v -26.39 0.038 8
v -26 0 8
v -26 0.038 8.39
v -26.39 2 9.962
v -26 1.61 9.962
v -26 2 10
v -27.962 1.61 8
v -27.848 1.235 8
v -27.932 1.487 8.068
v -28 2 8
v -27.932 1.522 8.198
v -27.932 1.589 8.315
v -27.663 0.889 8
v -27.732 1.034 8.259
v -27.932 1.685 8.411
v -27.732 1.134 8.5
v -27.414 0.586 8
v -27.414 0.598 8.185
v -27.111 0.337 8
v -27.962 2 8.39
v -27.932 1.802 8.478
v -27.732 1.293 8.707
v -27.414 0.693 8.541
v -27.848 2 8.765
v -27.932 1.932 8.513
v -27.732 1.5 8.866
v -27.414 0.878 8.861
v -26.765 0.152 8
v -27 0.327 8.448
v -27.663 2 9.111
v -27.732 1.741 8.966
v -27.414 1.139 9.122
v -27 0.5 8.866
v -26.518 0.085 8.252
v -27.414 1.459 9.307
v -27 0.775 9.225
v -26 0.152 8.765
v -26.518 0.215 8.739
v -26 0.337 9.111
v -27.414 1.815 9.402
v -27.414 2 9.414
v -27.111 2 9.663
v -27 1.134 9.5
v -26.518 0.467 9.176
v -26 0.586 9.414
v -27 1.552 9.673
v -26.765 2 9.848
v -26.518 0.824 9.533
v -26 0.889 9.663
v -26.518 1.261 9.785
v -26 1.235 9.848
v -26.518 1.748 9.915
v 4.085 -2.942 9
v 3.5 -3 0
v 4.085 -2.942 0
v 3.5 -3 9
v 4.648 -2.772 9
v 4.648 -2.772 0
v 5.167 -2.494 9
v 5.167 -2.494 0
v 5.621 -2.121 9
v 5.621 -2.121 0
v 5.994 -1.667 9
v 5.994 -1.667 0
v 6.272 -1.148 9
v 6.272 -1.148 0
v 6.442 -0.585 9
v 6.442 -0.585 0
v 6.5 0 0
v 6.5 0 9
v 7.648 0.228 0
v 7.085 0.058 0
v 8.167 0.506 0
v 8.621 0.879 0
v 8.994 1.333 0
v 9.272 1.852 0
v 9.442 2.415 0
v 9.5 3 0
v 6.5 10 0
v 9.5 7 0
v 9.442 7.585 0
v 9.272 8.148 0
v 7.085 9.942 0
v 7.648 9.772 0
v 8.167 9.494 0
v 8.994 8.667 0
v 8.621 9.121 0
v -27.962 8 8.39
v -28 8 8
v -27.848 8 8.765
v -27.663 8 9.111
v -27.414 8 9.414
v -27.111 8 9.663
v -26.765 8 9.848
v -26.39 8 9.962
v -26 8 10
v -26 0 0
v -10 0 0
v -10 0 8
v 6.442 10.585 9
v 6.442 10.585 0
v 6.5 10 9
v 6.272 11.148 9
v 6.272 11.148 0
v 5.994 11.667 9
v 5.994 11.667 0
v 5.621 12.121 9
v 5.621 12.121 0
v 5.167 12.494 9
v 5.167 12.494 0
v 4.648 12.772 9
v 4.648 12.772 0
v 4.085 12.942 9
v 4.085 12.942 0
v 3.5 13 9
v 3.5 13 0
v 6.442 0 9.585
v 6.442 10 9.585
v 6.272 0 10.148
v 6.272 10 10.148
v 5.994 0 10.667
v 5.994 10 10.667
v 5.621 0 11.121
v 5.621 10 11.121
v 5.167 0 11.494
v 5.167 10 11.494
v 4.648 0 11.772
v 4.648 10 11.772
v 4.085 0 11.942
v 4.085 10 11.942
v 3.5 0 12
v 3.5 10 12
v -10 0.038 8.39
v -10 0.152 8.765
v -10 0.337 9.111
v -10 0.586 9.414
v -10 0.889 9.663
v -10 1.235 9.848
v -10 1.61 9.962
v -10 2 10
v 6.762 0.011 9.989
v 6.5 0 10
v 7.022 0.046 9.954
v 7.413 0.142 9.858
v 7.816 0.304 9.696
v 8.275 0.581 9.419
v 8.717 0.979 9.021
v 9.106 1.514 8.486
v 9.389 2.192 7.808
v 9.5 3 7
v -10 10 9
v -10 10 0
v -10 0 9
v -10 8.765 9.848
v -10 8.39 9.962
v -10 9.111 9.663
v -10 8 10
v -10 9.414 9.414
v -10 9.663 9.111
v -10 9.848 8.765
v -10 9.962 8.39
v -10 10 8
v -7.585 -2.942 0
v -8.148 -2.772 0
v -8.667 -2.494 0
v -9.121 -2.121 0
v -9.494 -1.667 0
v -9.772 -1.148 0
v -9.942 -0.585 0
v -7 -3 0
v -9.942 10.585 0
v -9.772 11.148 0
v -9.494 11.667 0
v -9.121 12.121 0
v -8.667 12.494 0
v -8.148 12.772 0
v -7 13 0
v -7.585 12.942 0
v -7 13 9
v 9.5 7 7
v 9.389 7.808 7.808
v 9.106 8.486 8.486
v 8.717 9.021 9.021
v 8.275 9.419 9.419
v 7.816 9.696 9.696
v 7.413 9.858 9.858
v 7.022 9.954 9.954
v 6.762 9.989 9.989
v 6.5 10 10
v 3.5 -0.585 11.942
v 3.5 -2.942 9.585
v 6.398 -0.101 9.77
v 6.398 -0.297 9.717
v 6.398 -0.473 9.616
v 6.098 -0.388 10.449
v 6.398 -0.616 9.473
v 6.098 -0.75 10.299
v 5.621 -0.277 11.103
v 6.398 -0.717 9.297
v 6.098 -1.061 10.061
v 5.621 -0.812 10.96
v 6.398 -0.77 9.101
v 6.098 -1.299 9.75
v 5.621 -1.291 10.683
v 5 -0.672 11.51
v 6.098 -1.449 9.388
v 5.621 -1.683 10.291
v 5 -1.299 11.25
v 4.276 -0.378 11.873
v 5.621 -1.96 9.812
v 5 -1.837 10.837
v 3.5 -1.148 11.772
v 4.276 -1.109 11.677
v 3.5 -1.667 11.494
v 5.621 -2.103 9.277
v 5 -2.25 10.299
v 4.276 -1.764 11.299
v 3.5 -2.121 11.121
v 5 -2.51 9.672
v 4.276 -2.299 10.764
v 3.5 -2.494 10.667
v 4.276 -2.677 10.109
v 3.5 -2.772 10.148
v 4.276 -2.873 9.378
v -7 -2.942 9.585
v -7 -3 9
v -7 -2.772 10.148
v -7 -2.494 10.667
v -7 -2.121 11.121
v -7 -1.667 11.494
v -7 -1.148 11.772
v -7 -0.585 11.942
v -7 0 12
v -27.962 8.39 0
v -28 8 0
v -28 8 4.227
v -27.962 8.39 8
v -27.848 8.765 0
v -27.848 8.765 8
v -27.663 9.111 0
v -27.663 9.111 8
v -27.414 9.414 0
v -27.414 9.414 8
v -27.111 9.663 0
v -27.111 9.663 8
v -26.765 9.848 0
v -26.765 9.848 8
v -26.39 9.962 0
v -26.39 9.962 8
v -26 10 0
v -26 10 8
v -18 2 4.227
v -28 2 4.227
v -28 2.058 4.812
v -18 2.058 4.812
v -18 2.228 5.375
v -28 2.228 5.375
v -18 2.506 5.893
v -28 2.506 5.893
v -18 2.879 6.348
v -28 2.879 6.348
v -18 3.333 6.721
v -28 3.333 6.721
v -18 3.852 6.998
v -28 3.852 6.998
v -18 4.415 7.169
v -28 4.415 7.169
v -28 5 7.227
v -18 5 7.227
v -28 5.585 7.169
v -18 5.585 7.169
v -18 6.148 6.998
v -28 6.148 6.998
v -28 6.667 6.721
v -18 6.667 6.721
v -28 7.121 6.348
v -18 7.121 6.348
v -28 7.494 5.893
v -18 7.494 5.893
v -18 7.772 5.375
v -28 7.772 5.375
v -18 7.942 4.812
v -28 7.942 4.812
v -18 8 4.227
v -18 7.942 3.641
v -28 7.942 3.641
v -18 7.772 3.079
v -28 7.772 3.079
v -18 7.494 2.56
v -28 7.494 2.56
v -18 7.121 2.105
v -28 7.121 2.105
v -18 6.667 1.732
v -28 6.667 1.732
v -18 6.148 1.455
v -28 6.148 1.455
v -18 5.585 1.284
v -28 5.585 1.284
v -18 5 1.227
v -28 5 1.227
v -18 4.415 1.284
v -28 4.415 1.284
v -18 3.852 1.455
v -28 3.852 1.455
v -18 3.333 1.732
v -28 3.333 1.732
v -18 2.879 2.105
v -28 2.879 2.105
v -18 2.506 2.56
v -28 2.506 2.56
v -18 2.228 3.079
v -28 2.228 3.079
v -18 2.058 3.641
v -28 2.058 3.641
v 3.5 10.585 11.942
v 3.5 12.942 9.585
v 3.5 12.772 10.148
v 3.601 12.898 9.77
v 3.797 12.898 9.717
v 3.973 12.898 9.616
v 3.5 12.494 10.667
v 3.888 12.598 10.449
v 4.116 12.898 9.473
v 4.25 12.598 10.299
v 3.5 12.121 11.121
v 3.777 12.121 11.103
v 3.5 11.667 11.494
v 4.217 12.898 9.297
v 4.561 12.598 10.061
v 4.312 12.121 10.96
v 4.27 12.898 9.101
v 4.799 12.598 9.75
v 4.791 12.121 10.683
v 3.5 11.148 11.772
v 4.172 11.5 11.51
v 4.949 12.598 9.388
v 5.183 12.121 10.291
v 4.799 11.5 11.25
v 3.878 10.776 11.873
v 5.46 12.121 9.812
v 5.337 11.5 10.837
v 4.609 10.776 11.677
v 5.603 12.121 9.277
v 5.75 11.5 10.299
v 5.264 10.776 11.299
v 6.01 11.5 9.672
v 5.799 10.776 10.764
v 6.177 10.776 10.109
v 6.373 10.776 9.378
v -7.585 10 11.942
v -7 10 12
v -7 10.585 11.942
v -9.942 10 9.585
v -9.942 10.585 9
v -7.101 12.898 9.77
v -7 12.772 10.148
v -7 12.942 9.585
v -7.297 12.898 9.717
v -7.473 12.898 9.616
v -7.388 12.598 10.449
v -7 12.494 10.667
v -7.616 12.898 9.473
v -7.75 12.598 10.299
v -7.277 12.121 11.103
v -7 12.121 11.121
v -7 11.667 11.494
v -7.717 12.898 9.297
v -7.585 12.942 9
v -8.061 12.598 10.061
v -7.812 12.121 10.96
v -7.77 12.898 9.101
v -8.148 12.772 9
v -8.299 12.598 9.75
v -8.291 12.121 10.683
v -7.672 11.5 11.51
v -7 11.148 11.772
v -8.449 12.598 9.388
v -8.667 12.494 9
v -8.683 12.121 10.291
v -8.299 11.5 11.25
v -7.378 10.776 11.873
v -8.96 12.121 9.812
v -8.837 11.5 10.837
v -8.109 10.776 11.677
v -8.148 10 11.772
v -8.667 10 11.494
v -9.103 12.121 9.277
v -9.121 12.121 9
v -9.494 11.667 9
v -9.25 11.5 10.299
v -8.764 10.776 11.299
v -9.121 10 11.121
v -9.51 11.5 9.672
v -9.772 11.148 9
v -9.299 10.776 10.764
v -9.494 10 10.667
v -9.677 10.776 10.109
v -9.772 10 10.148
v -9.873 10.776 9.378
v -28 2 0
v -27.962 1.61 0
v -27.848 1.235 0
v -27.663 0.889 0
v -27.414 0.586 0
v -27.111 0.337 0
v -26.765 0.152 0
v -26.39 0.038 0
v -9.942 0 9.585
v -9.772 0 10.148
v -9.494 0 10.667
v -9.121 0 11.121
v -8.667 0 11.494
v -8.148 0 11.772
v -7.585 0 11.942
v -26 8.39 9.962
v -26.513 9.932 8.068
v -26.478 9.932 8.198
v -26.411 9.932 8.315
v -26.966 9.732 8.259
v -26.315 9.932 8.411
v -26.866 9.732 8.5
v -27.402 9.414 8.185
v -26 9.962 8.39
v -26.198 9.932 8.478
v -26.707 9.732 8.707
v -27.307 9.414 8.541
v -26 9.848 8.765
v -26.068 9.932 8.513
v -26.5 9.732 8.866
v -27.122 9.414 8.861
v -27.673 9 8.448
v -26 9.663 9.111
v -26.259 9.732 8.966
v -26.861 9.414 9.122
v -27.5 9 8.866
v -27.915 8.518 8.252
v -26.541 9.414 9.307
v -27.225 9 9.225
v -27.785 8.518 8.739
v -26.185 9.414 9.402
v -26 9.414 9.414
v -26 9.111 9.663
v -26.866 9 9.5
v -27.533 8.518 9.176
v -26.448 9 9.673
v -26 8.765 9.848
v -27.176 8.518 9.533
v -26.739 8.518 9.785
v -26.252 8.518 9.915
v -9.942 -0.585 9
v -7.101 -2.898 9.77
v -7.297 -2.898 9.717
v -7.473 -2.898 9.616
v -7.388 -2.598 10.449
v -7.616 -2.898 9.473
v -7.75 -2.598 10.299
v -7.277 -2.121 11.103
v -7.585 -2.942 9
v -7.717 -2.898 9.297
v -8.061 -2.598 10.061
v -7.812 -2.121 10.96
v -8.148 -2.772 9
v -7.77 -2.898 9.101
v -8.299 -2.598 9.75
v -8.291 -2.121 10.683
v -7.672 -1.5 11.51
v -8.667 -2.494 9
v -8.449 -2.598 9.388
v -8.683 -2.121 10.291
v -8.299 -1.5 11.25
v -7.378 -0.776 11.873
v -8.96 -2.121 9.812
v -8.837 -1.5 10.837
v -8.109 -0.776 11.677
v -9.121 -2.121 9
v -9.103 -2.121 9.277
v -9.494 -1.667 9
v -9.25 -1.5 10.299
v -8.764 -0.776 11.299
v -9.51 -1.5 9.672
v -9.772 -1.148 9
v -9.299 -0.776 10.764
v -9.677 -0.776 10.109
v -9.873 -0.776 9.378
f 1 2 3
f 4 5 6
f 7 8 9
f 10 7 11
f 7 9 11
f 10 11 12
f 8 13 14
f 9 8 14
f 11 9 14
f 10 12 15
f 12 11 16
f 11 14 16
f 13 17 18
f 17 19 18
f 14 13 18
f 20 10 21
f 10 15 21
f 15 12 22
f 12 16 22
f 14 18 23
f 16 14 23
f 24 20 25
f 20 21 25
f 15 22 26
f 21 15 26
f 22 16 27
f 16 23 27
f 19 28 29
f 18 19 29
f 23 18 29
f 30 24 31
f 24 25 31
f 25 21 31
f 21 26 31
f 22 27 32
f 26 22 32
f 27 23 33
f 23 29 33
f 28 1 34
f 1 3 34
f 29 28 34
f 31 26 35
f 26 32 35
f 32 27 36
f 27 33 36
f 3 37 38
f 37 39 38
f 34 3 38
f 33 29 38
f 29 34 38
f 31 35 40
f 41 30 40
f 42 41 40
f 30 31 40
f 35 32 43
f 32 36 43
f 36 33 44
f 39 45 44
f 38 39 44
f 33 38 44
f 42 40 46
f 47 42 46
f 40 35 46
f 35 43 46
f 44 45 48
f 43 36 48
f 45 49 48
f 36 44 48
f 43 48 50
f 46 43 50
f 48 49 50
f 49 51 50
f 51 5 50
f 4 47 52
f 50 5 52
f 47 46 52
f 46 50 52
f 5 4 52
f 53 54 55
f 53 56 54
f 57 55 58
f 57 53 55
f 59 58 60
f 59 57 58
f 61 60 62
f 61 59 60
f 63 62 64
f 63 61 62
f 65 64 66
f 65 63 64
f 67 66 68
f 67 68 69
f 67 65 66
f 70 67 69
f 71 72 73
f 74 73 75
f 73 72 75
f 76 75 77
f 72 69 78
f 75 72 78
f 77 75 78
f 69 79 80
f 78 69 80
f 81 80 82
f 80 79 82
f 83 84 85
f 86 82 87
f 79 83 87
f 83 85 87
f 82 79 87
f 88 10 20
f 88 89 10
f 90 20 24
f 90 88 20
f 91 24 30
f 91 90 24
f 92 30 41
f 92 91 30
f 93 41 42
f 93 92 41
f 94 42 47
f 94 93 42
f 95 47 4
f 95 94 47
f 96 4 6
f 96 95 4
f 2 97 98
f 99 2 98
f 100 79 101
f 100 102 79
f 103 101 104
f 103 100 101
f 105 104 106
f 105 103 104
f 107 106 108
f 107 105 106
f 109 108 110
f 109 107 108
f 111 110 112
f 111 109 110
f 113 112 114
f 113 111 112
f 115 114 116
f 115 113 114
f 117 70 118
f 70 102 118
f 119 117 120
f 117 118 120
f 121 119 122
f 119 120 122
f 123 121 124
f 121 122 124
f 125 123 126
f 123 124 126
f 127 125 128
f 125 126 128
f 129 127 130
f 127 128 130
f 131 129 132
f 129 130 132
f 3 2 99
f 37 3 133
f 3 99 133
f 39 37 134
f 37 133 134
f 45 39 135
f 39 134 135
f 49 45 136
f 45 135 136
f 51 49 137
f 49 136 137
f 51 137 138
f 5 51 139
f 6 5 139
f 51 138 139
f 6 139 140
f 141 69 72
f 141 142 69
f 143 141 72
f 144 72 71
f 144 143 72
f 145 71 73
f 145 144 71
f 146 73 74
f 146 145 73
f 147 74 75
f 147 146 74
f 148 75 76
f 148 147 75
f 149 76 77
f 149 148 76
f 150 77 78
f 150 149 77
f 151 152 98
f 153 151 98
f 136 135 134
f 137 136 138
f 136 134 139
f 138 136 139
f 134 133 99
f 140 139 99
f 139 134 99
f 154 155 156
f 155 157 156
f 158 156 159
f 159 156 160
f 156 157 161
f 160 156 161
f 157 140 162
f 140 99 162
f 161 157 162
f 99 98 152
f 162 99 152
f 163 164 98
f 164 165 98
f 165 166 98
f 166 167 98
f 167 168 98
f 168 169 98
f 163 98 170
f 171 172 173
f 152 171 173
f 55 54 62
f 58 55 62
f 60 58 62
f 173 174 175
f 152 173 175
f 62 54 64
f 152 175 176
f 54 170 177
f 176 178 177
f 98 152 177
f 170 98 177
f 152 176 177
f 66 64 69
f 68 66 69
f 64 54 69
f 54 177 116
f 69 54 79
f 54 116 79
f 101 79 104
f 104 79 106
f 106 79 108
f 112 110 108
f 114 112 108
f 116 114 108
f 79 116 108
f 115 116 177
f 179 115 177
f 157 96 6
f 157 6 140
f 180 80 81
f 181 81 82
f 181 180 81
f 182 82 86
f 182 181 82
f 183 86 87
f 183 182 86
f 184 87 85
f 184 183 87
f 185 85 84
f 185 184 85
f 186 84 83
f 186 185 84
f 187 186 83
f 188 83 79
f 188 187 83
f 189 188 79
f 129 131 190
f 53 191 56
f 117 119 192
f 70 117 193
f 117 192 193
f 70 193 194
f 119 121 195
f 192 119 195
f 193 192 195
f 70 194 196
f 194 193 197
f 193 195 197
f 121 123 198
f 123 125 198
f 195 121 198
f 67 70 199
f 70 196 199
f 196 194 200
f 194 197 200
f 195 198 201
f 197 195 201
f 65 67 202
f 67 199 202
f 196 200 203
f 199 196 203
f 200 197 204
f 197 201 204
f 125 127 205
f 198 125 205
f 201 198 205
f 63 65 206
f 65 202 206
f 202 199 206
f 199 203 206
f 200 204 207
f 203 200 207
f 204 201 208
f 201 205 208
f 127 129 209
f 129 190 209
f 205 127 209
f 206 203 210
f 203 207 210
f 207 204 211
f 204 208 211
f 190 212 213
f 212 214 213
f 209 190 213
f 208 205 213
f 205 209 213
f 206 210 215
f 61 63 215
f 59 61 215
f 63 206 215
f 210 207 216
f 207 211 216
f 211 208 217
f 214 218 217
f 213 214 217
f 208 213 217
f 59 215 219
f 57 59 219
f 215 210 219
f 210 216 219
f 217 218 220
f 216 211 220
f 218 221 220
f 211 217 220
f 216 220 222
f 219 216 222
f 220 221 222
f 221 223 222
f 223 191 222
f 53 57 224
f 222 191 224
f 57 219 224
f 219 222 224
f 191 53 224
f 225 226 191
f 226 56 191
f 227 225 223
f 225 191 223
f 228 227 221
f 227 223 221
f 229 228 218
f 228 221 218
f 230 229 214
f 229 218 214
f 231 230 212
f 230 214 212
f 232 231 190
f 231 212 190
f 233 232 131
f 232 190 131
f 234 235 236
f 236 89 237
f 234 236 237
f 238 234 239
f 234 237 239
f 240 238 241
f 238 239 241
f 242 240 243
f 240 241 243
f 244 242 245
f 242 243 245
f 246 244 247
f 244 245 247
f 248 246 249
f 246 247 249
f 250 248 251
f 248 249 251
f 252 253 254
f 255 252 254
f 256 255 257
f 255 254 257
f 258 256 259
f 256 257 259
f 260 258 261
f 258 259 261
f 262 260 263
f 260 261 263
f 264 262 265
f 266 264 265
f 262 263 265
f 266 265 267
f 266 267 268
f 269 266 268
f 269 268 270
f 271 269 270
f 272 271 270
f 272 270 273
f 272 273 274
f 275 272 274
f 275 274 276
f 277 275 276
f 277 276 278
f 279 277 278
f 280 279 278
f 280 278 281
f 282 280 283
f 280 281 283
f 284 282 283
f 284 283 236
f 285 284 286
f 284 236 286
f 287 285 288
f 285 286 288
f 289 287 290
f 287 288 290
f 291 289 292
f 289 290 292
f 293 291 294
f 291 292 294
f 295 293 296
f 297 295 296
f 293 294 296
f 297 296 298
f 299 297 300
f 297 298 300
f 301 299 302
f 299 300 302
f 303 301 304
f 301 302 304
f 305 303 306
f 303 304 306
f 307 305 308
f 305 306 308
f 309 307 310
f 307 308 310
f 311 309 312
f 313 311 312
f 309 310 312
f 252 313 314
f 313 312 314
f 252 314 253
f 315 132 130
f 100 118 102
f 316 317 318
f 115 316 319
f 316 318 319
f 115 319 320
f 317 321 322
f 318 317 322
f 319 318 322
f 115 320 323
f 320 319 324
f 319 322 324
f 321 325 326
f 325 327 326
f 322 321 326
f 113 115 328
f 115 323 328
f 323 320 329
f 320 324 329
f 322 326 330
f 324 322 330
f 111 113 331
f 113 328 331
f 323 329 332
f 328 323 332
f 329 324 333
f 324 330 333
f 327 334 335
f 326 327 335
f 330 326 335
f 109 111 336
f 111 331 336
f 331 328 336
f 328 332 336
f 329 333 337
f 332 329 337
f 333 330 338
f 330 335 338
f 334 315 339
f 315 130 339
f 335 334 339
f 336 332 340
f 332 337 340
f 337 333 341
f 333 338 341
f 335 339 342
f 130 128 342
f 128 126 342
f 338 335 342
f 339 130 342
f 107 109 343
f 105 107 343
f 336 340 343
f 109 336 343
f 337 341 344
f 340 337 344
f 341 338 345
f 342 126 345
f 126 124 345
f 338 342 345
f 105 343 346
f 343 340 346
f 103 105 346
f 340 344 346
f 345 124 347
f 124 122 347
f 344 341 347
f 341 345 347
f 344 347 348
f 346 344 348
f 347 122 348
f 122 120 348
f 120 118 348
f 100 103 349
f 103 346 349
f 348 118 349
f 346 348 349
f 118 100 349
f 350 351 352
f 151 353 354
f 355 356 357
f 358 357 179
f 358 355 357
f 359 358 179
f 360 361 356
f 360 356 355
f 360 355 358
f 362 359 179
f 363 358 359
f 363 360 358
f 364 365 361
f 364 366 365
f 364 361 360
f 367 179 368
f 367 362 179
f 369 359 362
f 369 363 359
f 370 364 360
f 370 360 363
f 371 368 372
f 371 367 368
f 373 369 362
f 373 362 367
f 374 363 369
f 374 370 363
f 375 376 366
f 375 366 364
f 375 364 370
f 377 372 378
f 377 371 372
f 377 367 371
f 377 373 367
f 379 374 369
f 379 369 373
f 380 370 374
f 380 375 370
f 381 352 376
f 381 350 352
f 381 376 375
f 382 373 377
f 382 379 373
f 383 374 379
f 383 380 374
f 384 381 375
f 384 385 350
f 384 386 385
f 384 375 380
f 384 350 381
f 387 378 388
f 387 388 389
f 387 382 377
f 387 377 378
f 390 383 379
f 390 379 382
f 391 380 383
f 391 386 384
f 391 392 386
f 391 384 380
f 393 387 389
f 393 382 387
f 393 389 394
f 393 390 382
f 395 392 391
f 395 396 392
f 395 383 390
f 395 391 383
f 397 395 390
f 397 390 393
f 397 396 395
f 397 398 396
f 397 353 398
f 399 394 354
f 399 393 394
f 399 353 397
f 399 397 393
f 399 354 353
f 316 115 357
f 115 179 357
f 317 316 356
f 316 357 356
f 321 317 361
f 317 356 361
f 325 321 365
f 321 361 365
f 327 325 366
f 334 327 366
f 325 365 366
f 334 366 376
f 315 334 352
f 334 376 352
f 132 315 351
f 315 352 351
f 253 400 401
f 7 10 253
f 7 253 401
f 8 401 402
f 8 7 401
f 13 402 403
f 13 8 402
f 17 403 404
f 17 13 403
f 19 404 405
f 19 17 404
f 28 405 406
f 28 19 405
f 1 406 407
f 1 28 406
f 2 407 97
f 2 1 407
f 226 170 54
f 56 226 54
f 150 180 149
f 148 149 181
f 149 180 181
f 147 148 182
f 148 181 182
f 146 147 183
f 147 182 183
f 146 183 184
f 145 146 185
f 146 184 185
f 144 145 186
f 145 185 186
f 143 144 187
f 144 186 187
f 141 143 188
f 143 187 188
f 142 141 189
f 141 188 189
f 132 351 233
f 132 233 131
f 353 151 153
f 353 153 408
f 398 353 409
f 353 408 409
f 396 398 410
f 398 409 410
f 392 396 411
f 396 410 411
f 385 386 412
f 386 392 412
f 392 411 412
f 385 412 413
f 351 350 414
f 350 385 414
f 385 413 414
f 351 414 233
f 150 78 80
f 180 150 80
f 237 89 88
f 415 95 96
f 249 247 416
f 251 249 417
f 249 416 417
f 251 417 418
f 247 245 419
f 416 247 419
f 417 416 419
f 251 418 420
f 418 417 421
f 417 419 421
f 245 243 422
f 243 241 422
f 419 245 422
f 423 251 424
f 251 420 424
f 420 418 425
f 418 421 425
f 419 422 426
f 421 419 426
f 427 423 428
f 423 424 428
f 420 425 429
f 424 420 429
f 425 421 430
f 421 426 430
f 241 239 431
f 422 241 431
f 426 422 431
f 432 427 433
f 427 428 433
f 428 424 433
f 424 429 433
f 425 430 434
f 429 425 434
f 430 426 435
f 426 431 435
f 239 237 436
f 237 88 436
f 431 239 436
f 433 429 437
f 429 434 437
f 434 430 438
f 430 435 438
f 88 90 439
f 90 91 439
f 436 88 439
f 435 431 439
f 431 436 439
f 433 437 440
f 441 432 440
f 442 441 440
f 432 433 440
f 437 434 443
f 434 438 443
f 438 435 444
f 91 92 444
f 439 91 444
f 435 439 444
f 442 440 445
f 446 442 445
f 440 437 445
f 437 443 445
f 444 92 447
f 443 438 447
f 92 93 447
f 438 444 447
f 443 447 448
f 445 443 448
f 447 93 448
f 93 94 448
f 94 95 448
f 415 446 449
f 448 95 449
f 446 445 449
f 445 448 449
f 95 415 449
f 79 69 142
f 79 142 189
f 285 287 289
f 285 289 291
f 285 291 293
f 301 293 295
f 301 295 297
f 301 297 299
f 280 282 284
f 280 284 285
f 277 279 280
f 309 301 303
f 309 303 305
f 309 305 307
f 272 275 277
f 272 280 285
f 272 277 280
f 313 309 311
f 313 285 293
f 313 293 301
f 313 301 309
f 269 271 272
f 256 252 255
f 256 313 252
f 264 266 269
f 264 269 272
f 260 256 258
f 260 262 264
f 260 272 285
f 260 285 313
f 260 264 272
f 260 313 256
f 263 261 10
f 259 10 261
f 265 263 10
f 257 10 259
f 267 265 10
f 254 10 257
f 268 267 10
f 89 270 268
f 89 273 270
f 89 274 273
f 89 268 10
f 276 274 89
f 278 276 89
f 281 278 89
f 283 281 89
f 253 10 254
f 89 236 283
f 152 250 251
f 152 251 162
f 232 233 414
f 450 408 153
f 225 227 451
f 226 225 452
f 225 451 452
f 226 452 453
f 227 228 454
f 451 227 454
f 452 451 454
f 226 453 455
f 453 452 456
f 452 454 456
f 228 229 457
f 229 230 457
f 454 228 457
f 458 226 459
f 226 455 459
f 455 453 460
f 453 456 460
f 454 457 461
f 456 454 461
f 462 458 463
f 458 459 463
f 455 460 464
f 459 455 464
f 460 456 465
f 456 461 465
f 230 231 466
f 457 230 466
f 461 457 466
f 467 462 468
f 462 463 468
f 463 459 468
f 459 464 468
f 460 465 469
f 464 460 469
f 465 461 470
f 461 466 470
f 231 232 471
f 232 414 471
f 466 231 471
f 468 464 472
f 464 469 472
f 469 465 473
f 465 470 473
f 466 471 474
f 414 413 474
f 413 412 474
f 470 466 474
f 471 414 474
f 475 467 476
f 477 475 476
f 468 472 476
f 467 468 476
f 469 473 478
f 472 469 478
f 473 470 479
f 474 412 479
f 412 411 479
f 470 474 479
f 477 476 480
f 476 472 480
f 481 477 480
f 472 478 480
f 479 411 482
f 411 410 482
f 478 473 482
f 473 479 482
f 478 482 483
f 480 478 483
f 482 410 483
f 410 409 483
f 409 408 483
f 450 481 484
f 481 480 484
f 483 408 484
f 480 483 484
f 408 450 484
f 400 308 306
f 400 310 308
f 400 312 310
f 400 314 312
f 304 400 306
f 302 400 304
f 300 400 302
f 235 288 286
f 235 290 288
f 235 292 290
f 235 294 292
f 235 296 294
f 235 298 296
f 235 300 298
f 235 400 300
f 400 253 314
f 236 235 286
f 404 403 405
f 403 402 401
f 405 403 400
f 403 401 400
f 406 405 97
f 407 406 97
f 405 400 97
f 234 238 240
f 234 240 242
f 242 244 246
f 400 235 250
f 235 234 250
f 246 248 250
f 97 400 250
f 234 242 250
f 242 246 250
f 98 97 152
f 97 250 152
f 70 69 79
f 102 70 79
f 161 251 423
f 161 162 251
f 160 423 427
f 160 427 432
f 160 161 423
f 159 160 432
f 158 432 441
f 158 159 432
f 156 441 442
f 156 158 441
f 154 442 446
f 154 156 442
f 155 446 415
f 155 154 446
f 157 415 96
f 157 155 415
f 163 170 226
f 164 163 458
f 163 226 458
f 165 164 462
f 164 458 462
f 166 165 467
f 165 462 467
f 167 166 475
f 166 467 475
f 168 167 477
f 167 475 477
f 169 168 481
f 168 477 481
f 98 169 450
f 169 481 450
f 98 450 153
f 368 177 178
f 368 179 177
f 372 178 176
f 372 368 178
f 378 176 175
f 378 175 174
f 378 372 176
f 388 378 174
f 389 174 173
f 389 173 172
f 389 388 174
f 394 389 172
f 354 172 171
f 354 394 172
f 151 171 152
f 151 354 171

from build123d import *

# Parameters (mm, degrees)
F0_W     = 18.0000008929
F0_H     = 10
F1_DEPTH = 10
F0_W_2   = 3
F2_DEPTH = 12
F3_R     = 2
F4_R     = 3
F5_R     = 2.99999
F7_DEPTH = 10


# Not quite as in the source:
# - a fillet or chamfer is up to 0.001 mm smaller than in the source, because OpenCascade refuses the exact size


with BuildPart() as f1:
    # F0 (on Top) → F1 (new body)
    with BuildSketch(Plane.XY):
        with Locations((-18.9999995536, 5)):
            Rectangle(F0_W, F0_H)
    extrude(amount=F1_DEPTH)

    # F3
    f3_edges = [f1.edges().sort_by_distance(p)[0] for p in [
        (-19, 0, 10),
        (-28, 0, 5),
        (-28, 5, 10),
        (-28, 10, 5),
        (-19, 10, 10),
    ]]
    fillet(f3_edges, radius=F3_R)

    # F6 (on face) → F7 (cut)
    with BuildSketch(Plane(origin=(-28, 0, 0), x_dir=(0, -1, 0), z_dir=(-1, 0, 0))):
        with BuildLine():
            ThreePointArc((-8, 4.2267539538), (-5, 1.2267539538), (-2, 4.2267539538))
            ThreePointArc((-2, 4.2267539538), (-5, 7.2267539538), (-8, 4.2267539538))
        make_face()
    extrude(amount=-F7_DEPTH, mode=Mode.SUBTRACT)


with BuildPart() as f1b:
    # F0 (on Top) → F1, piece 2 (new body)
    with BuildSketch(Plane.XY):
        with Locations((7.9999984374, 5)):
            Rectangle(F0_W_2, F0_H)
    extrude(amount=F1_DEPTH)

    # F5 (radius 3 in the source; OpenCascade refuses exactly that, so slightly less here)
    f5_edges = [f1b.edges().sort_by_distance(p)[0] for p in [
        (9.499998, 5, 10),
        (9.499998, 0, 5),
        (9.499998, 10, 5),
    ]]
    fillet(f5_edges, radius=F5_R)


with BuildPart() as f2:
    # F0 (on Top) → F2 (new body)
    with BuildSketch(Plane.XY):
        Polygon((-9.9999991071, 10), (-9.9999991071, 0), (-9.9999991071, -3.0000002232), (6.4999984374, -3.0000002232), (6.4999984374, 0), (6.4999984374, 10), (6.4999984374, 13.0000013393), (-9.9999991071, 13.0000013393), align=None)
    extrude(amount=F2_DEPTH)

    # F4
    f4_edges = [f2.edges().sort_by_distance(p)[0] for p in [
        (-9.999999, 5.000001, 12),
        (-1.75, -3, 12),
        (6.499998, 5.000001, 12),
        (-1.75, 13.000001, 12),
        (6.499998, -3, 6),
        (-9.999999, -3, 6),
        (-9.999999, 13.000001, 6),
        (6.499998, 13.000001, 6),
    ]]
    fillet(f4_edges, radius=F4_R)


solid = Compound([f1.part, f1b.part, f2.part])
